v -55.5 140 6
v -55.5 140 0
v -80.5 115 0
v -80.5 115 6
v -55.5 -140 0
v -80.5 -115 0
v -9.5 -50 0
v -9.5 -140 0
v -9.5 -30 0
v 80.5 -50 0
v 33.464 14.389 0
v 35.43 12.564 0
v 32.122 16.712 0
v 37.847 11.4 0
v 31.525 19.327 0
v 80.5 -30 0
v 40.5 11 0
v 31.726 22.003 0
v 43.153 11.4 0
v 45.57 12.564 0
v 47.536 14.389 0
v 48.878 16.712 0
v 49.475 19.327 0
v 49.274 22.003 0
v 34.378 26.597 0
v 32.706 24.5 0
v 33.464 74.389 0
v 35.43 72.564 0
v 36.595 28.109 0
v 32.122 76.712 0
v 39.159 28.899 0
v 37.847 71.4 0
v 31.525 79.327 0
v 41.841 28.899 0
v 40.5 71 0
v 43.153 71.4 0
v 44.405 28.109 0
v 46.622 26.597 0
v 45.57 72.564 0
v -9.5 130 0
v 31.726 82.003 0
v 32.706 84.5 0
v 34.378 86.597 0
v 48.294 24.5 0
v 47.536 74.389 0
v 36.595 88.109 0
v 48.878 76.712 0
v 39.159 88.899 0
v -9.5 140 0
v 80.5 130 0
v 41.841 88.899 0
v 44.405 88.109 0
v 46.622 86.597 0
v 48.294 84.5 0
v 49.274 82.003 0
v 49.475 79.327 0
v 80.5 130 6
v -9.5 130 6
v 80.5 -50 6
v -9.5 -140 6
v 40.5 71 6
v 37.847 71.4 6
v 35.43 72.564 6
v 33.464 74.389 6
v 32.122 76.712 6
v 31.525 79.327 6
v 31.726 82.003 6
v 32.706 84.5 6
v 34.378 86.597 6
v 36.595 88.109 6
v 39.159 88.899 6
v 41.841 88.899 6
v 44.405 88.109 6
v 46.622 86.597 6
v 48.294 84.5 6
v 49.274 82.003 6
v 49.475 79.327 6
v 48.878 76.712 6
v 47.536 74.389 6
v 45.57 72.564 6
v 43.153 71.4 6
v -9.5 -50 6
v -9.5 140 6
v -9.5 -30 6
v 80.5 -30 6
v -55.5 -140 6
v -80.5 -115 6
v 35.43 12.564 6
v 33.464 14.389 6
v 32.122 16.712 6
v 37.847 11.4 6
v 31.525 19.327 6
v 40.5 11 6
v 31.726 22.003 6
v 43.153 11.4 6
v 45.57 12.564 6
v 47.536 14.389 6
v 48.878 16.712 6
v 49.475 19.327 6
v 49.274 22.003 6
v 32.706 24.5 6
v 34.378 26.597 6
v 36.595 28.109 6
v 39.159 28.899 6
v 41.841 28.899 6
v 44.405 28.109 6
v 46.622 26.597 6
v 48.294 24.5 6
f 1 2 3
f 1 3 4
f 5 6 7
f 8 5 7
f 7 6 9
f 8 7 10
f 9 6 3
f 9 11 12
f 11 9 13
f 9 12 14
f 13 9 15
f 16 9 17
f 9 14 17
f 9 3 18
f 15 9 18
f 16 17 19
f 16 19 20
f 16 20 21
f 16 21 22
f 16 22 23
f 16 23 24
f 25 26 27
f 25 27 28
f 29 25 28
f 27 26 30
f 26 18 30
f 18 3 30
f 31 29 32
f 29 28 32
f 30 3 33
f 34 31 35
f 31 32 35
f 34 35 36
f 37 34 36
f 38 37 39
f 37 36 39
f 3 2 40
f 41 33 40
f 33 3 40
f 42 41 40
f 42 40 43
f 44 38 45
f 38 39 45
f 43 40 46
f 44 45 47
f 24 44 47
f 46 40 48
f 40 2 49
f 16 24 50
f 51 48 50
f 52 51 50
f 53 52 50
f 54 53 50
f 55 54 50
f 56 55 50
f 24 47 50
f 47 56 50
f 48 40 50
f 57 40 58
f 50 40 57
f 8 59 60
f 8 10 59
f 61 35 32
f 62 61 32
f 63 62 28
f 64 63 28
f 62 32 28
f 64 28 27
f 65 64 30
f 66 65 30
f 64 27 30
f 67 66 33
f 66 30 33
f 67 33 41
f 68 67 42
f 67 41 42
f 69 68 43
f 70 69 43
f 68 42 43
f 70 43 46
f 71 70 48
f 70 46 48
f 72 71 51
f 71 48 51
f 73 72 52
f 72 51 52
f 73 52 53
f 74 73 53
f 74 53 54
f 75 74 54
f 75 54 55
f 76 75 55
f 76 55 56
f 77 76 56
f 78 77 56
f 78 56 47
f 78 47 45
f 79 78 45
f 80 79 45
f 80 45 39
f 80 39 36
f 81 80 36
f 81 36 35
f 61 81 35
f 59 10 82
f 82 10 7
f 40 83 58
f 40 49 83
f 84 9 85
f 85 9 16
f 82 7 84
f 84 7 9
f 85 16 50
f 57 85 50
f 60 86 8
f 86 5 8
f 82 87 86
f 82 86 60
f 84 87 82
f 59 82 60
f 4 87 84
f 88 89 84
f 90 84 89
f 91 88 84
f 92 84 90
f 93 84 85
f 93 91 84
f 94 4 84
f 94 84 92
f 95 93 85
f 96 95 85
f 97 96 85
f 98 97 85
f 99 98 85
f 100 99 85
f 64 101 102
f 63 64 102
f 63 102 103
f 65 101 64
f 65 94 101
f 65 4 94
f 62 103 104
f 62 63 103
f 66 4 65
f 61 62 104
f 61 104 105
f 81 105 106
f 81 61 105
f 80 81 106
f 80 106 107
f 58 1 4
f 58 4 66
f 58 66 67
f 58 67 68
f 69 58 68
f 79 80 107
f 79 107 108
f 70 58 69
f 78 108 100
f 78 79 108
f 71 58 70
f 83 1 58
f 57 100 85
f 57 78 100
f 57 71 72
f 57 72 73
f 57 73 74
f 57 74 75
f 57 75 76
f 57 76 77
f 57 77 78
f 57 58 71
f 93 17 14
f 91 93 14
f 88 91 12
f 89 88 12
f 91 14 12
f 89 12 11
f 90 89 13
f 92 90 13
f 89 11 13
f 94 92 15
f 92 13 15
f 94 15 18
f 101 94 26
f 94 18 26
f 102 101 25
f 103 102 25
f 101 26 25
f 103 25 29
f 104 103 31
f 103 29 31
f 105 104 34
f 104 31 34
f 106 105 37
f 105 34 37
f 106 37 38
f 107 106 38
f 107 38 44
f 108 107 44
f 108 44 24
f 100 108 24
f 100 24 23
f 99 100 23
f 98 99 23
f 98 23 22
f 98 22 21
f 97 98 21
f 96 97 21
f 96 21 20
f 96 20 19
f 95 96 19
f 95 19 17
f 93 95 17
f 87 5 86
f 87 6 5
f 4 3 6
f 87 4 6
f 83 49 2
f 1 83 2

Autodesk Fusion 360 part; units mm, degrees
sketch "スケッチ1" plane through (0, 0, 0) normal (0, 0, 1) x (1, 0, 0)
  line L0 (-9.5, 140) -> (-80.5, 140)
  line L1 (-80.5, 140) -> (-80.5, -140)
  line L2 (-80.5, -140) -> (-9.5, -140)
  line L3 (80.5, -30) -> (80.5, 130)
  line L4 (74.75, 130) -> (-80.5, -140) construction
  line L5 (-9.5, 140) -> (-9.5, 130)
  line L6 (-9.5, 130) -> (80.5, 130)
  line L7 (-80.5, -140) -> (-9.5, -140) construction
  line L8 (80.5, -50) -> (-9.5, -140)
  line L9 (80.5, -50) -> (-9.5, -50)
  line L10 (-9.5, -50) -> (-9.5, -30)
  line L11 (-9.5, -30) -> (80.5, -30)
  line L12 (-80.5, 140) -> (17.25, -30) construction
  line L13 (28.75, -50) -> (47.6429, -82.8571) construction
  dimension "d2" = 280
  dimension "d5" = 71
  dimension "d7" = 90
  dimension "d8" = 20
extrude "押し出し1" add sketch "スケッチ1" along normal blind 6
chamfer "面取り1" distance 25 angle 45 2 edges at (-80.5, -140, 3) (-80.5, 140, 3)
sketch "スケッチ2" plane through (0, 0, 6) normal (0, 0, 1) x (-1, 0, 0)
  line L0 (55.5, -140) -> (80.5, -115)
  line L1 (80.5, -115) -> (80.5, 115)
  line L2 (80.5, 115) -> (55.5, 140)
  line L3 (55.5, 140) -> (9.5, 140)
  line L4 (9.5, 140) -> (-80.5, 50)
  line L5 (-80.5, 50) -> (9.5, 50)
  line L6 (9.5, 50) -> (9.5, 30)
  line L7 (9.5, 30) -> (-80.5, 30)
  line L8 (-80.5, 30) -> (-80.5, -130)
  line L9 (-80.5, -130) -> (9.5, -130)
  line L10 (9.5, -130) -> (9.5, -140)
  line L11 (9.5, -140) -> (55.5, -140)
  line L12 (-80.5, -130) -> (-40.5, -130) construction
  line L13 (-40.5, -130) -> (-40.5, -80) construction
  line L14 (-40.5, -80) -> (-80.5, -80) construction
  line L15 (-80.5, -80) -> (-80.5, -130) construction
  line L16 (-40.5, -80) -> (-40.5, -20) construction
  point P0 (-40.5, -80)
  point P1 (-40.5, -20)
  dimension "d12" = 40
  dimension "d13" = 50
  dimension "d14" = 60
hole "穴1" at (40.5, 80, 6) at (40.5, 20, 6) direction (0, 0, -1) diameter 18 end through all
equation "d5 = 25 mm + 46 mm"
